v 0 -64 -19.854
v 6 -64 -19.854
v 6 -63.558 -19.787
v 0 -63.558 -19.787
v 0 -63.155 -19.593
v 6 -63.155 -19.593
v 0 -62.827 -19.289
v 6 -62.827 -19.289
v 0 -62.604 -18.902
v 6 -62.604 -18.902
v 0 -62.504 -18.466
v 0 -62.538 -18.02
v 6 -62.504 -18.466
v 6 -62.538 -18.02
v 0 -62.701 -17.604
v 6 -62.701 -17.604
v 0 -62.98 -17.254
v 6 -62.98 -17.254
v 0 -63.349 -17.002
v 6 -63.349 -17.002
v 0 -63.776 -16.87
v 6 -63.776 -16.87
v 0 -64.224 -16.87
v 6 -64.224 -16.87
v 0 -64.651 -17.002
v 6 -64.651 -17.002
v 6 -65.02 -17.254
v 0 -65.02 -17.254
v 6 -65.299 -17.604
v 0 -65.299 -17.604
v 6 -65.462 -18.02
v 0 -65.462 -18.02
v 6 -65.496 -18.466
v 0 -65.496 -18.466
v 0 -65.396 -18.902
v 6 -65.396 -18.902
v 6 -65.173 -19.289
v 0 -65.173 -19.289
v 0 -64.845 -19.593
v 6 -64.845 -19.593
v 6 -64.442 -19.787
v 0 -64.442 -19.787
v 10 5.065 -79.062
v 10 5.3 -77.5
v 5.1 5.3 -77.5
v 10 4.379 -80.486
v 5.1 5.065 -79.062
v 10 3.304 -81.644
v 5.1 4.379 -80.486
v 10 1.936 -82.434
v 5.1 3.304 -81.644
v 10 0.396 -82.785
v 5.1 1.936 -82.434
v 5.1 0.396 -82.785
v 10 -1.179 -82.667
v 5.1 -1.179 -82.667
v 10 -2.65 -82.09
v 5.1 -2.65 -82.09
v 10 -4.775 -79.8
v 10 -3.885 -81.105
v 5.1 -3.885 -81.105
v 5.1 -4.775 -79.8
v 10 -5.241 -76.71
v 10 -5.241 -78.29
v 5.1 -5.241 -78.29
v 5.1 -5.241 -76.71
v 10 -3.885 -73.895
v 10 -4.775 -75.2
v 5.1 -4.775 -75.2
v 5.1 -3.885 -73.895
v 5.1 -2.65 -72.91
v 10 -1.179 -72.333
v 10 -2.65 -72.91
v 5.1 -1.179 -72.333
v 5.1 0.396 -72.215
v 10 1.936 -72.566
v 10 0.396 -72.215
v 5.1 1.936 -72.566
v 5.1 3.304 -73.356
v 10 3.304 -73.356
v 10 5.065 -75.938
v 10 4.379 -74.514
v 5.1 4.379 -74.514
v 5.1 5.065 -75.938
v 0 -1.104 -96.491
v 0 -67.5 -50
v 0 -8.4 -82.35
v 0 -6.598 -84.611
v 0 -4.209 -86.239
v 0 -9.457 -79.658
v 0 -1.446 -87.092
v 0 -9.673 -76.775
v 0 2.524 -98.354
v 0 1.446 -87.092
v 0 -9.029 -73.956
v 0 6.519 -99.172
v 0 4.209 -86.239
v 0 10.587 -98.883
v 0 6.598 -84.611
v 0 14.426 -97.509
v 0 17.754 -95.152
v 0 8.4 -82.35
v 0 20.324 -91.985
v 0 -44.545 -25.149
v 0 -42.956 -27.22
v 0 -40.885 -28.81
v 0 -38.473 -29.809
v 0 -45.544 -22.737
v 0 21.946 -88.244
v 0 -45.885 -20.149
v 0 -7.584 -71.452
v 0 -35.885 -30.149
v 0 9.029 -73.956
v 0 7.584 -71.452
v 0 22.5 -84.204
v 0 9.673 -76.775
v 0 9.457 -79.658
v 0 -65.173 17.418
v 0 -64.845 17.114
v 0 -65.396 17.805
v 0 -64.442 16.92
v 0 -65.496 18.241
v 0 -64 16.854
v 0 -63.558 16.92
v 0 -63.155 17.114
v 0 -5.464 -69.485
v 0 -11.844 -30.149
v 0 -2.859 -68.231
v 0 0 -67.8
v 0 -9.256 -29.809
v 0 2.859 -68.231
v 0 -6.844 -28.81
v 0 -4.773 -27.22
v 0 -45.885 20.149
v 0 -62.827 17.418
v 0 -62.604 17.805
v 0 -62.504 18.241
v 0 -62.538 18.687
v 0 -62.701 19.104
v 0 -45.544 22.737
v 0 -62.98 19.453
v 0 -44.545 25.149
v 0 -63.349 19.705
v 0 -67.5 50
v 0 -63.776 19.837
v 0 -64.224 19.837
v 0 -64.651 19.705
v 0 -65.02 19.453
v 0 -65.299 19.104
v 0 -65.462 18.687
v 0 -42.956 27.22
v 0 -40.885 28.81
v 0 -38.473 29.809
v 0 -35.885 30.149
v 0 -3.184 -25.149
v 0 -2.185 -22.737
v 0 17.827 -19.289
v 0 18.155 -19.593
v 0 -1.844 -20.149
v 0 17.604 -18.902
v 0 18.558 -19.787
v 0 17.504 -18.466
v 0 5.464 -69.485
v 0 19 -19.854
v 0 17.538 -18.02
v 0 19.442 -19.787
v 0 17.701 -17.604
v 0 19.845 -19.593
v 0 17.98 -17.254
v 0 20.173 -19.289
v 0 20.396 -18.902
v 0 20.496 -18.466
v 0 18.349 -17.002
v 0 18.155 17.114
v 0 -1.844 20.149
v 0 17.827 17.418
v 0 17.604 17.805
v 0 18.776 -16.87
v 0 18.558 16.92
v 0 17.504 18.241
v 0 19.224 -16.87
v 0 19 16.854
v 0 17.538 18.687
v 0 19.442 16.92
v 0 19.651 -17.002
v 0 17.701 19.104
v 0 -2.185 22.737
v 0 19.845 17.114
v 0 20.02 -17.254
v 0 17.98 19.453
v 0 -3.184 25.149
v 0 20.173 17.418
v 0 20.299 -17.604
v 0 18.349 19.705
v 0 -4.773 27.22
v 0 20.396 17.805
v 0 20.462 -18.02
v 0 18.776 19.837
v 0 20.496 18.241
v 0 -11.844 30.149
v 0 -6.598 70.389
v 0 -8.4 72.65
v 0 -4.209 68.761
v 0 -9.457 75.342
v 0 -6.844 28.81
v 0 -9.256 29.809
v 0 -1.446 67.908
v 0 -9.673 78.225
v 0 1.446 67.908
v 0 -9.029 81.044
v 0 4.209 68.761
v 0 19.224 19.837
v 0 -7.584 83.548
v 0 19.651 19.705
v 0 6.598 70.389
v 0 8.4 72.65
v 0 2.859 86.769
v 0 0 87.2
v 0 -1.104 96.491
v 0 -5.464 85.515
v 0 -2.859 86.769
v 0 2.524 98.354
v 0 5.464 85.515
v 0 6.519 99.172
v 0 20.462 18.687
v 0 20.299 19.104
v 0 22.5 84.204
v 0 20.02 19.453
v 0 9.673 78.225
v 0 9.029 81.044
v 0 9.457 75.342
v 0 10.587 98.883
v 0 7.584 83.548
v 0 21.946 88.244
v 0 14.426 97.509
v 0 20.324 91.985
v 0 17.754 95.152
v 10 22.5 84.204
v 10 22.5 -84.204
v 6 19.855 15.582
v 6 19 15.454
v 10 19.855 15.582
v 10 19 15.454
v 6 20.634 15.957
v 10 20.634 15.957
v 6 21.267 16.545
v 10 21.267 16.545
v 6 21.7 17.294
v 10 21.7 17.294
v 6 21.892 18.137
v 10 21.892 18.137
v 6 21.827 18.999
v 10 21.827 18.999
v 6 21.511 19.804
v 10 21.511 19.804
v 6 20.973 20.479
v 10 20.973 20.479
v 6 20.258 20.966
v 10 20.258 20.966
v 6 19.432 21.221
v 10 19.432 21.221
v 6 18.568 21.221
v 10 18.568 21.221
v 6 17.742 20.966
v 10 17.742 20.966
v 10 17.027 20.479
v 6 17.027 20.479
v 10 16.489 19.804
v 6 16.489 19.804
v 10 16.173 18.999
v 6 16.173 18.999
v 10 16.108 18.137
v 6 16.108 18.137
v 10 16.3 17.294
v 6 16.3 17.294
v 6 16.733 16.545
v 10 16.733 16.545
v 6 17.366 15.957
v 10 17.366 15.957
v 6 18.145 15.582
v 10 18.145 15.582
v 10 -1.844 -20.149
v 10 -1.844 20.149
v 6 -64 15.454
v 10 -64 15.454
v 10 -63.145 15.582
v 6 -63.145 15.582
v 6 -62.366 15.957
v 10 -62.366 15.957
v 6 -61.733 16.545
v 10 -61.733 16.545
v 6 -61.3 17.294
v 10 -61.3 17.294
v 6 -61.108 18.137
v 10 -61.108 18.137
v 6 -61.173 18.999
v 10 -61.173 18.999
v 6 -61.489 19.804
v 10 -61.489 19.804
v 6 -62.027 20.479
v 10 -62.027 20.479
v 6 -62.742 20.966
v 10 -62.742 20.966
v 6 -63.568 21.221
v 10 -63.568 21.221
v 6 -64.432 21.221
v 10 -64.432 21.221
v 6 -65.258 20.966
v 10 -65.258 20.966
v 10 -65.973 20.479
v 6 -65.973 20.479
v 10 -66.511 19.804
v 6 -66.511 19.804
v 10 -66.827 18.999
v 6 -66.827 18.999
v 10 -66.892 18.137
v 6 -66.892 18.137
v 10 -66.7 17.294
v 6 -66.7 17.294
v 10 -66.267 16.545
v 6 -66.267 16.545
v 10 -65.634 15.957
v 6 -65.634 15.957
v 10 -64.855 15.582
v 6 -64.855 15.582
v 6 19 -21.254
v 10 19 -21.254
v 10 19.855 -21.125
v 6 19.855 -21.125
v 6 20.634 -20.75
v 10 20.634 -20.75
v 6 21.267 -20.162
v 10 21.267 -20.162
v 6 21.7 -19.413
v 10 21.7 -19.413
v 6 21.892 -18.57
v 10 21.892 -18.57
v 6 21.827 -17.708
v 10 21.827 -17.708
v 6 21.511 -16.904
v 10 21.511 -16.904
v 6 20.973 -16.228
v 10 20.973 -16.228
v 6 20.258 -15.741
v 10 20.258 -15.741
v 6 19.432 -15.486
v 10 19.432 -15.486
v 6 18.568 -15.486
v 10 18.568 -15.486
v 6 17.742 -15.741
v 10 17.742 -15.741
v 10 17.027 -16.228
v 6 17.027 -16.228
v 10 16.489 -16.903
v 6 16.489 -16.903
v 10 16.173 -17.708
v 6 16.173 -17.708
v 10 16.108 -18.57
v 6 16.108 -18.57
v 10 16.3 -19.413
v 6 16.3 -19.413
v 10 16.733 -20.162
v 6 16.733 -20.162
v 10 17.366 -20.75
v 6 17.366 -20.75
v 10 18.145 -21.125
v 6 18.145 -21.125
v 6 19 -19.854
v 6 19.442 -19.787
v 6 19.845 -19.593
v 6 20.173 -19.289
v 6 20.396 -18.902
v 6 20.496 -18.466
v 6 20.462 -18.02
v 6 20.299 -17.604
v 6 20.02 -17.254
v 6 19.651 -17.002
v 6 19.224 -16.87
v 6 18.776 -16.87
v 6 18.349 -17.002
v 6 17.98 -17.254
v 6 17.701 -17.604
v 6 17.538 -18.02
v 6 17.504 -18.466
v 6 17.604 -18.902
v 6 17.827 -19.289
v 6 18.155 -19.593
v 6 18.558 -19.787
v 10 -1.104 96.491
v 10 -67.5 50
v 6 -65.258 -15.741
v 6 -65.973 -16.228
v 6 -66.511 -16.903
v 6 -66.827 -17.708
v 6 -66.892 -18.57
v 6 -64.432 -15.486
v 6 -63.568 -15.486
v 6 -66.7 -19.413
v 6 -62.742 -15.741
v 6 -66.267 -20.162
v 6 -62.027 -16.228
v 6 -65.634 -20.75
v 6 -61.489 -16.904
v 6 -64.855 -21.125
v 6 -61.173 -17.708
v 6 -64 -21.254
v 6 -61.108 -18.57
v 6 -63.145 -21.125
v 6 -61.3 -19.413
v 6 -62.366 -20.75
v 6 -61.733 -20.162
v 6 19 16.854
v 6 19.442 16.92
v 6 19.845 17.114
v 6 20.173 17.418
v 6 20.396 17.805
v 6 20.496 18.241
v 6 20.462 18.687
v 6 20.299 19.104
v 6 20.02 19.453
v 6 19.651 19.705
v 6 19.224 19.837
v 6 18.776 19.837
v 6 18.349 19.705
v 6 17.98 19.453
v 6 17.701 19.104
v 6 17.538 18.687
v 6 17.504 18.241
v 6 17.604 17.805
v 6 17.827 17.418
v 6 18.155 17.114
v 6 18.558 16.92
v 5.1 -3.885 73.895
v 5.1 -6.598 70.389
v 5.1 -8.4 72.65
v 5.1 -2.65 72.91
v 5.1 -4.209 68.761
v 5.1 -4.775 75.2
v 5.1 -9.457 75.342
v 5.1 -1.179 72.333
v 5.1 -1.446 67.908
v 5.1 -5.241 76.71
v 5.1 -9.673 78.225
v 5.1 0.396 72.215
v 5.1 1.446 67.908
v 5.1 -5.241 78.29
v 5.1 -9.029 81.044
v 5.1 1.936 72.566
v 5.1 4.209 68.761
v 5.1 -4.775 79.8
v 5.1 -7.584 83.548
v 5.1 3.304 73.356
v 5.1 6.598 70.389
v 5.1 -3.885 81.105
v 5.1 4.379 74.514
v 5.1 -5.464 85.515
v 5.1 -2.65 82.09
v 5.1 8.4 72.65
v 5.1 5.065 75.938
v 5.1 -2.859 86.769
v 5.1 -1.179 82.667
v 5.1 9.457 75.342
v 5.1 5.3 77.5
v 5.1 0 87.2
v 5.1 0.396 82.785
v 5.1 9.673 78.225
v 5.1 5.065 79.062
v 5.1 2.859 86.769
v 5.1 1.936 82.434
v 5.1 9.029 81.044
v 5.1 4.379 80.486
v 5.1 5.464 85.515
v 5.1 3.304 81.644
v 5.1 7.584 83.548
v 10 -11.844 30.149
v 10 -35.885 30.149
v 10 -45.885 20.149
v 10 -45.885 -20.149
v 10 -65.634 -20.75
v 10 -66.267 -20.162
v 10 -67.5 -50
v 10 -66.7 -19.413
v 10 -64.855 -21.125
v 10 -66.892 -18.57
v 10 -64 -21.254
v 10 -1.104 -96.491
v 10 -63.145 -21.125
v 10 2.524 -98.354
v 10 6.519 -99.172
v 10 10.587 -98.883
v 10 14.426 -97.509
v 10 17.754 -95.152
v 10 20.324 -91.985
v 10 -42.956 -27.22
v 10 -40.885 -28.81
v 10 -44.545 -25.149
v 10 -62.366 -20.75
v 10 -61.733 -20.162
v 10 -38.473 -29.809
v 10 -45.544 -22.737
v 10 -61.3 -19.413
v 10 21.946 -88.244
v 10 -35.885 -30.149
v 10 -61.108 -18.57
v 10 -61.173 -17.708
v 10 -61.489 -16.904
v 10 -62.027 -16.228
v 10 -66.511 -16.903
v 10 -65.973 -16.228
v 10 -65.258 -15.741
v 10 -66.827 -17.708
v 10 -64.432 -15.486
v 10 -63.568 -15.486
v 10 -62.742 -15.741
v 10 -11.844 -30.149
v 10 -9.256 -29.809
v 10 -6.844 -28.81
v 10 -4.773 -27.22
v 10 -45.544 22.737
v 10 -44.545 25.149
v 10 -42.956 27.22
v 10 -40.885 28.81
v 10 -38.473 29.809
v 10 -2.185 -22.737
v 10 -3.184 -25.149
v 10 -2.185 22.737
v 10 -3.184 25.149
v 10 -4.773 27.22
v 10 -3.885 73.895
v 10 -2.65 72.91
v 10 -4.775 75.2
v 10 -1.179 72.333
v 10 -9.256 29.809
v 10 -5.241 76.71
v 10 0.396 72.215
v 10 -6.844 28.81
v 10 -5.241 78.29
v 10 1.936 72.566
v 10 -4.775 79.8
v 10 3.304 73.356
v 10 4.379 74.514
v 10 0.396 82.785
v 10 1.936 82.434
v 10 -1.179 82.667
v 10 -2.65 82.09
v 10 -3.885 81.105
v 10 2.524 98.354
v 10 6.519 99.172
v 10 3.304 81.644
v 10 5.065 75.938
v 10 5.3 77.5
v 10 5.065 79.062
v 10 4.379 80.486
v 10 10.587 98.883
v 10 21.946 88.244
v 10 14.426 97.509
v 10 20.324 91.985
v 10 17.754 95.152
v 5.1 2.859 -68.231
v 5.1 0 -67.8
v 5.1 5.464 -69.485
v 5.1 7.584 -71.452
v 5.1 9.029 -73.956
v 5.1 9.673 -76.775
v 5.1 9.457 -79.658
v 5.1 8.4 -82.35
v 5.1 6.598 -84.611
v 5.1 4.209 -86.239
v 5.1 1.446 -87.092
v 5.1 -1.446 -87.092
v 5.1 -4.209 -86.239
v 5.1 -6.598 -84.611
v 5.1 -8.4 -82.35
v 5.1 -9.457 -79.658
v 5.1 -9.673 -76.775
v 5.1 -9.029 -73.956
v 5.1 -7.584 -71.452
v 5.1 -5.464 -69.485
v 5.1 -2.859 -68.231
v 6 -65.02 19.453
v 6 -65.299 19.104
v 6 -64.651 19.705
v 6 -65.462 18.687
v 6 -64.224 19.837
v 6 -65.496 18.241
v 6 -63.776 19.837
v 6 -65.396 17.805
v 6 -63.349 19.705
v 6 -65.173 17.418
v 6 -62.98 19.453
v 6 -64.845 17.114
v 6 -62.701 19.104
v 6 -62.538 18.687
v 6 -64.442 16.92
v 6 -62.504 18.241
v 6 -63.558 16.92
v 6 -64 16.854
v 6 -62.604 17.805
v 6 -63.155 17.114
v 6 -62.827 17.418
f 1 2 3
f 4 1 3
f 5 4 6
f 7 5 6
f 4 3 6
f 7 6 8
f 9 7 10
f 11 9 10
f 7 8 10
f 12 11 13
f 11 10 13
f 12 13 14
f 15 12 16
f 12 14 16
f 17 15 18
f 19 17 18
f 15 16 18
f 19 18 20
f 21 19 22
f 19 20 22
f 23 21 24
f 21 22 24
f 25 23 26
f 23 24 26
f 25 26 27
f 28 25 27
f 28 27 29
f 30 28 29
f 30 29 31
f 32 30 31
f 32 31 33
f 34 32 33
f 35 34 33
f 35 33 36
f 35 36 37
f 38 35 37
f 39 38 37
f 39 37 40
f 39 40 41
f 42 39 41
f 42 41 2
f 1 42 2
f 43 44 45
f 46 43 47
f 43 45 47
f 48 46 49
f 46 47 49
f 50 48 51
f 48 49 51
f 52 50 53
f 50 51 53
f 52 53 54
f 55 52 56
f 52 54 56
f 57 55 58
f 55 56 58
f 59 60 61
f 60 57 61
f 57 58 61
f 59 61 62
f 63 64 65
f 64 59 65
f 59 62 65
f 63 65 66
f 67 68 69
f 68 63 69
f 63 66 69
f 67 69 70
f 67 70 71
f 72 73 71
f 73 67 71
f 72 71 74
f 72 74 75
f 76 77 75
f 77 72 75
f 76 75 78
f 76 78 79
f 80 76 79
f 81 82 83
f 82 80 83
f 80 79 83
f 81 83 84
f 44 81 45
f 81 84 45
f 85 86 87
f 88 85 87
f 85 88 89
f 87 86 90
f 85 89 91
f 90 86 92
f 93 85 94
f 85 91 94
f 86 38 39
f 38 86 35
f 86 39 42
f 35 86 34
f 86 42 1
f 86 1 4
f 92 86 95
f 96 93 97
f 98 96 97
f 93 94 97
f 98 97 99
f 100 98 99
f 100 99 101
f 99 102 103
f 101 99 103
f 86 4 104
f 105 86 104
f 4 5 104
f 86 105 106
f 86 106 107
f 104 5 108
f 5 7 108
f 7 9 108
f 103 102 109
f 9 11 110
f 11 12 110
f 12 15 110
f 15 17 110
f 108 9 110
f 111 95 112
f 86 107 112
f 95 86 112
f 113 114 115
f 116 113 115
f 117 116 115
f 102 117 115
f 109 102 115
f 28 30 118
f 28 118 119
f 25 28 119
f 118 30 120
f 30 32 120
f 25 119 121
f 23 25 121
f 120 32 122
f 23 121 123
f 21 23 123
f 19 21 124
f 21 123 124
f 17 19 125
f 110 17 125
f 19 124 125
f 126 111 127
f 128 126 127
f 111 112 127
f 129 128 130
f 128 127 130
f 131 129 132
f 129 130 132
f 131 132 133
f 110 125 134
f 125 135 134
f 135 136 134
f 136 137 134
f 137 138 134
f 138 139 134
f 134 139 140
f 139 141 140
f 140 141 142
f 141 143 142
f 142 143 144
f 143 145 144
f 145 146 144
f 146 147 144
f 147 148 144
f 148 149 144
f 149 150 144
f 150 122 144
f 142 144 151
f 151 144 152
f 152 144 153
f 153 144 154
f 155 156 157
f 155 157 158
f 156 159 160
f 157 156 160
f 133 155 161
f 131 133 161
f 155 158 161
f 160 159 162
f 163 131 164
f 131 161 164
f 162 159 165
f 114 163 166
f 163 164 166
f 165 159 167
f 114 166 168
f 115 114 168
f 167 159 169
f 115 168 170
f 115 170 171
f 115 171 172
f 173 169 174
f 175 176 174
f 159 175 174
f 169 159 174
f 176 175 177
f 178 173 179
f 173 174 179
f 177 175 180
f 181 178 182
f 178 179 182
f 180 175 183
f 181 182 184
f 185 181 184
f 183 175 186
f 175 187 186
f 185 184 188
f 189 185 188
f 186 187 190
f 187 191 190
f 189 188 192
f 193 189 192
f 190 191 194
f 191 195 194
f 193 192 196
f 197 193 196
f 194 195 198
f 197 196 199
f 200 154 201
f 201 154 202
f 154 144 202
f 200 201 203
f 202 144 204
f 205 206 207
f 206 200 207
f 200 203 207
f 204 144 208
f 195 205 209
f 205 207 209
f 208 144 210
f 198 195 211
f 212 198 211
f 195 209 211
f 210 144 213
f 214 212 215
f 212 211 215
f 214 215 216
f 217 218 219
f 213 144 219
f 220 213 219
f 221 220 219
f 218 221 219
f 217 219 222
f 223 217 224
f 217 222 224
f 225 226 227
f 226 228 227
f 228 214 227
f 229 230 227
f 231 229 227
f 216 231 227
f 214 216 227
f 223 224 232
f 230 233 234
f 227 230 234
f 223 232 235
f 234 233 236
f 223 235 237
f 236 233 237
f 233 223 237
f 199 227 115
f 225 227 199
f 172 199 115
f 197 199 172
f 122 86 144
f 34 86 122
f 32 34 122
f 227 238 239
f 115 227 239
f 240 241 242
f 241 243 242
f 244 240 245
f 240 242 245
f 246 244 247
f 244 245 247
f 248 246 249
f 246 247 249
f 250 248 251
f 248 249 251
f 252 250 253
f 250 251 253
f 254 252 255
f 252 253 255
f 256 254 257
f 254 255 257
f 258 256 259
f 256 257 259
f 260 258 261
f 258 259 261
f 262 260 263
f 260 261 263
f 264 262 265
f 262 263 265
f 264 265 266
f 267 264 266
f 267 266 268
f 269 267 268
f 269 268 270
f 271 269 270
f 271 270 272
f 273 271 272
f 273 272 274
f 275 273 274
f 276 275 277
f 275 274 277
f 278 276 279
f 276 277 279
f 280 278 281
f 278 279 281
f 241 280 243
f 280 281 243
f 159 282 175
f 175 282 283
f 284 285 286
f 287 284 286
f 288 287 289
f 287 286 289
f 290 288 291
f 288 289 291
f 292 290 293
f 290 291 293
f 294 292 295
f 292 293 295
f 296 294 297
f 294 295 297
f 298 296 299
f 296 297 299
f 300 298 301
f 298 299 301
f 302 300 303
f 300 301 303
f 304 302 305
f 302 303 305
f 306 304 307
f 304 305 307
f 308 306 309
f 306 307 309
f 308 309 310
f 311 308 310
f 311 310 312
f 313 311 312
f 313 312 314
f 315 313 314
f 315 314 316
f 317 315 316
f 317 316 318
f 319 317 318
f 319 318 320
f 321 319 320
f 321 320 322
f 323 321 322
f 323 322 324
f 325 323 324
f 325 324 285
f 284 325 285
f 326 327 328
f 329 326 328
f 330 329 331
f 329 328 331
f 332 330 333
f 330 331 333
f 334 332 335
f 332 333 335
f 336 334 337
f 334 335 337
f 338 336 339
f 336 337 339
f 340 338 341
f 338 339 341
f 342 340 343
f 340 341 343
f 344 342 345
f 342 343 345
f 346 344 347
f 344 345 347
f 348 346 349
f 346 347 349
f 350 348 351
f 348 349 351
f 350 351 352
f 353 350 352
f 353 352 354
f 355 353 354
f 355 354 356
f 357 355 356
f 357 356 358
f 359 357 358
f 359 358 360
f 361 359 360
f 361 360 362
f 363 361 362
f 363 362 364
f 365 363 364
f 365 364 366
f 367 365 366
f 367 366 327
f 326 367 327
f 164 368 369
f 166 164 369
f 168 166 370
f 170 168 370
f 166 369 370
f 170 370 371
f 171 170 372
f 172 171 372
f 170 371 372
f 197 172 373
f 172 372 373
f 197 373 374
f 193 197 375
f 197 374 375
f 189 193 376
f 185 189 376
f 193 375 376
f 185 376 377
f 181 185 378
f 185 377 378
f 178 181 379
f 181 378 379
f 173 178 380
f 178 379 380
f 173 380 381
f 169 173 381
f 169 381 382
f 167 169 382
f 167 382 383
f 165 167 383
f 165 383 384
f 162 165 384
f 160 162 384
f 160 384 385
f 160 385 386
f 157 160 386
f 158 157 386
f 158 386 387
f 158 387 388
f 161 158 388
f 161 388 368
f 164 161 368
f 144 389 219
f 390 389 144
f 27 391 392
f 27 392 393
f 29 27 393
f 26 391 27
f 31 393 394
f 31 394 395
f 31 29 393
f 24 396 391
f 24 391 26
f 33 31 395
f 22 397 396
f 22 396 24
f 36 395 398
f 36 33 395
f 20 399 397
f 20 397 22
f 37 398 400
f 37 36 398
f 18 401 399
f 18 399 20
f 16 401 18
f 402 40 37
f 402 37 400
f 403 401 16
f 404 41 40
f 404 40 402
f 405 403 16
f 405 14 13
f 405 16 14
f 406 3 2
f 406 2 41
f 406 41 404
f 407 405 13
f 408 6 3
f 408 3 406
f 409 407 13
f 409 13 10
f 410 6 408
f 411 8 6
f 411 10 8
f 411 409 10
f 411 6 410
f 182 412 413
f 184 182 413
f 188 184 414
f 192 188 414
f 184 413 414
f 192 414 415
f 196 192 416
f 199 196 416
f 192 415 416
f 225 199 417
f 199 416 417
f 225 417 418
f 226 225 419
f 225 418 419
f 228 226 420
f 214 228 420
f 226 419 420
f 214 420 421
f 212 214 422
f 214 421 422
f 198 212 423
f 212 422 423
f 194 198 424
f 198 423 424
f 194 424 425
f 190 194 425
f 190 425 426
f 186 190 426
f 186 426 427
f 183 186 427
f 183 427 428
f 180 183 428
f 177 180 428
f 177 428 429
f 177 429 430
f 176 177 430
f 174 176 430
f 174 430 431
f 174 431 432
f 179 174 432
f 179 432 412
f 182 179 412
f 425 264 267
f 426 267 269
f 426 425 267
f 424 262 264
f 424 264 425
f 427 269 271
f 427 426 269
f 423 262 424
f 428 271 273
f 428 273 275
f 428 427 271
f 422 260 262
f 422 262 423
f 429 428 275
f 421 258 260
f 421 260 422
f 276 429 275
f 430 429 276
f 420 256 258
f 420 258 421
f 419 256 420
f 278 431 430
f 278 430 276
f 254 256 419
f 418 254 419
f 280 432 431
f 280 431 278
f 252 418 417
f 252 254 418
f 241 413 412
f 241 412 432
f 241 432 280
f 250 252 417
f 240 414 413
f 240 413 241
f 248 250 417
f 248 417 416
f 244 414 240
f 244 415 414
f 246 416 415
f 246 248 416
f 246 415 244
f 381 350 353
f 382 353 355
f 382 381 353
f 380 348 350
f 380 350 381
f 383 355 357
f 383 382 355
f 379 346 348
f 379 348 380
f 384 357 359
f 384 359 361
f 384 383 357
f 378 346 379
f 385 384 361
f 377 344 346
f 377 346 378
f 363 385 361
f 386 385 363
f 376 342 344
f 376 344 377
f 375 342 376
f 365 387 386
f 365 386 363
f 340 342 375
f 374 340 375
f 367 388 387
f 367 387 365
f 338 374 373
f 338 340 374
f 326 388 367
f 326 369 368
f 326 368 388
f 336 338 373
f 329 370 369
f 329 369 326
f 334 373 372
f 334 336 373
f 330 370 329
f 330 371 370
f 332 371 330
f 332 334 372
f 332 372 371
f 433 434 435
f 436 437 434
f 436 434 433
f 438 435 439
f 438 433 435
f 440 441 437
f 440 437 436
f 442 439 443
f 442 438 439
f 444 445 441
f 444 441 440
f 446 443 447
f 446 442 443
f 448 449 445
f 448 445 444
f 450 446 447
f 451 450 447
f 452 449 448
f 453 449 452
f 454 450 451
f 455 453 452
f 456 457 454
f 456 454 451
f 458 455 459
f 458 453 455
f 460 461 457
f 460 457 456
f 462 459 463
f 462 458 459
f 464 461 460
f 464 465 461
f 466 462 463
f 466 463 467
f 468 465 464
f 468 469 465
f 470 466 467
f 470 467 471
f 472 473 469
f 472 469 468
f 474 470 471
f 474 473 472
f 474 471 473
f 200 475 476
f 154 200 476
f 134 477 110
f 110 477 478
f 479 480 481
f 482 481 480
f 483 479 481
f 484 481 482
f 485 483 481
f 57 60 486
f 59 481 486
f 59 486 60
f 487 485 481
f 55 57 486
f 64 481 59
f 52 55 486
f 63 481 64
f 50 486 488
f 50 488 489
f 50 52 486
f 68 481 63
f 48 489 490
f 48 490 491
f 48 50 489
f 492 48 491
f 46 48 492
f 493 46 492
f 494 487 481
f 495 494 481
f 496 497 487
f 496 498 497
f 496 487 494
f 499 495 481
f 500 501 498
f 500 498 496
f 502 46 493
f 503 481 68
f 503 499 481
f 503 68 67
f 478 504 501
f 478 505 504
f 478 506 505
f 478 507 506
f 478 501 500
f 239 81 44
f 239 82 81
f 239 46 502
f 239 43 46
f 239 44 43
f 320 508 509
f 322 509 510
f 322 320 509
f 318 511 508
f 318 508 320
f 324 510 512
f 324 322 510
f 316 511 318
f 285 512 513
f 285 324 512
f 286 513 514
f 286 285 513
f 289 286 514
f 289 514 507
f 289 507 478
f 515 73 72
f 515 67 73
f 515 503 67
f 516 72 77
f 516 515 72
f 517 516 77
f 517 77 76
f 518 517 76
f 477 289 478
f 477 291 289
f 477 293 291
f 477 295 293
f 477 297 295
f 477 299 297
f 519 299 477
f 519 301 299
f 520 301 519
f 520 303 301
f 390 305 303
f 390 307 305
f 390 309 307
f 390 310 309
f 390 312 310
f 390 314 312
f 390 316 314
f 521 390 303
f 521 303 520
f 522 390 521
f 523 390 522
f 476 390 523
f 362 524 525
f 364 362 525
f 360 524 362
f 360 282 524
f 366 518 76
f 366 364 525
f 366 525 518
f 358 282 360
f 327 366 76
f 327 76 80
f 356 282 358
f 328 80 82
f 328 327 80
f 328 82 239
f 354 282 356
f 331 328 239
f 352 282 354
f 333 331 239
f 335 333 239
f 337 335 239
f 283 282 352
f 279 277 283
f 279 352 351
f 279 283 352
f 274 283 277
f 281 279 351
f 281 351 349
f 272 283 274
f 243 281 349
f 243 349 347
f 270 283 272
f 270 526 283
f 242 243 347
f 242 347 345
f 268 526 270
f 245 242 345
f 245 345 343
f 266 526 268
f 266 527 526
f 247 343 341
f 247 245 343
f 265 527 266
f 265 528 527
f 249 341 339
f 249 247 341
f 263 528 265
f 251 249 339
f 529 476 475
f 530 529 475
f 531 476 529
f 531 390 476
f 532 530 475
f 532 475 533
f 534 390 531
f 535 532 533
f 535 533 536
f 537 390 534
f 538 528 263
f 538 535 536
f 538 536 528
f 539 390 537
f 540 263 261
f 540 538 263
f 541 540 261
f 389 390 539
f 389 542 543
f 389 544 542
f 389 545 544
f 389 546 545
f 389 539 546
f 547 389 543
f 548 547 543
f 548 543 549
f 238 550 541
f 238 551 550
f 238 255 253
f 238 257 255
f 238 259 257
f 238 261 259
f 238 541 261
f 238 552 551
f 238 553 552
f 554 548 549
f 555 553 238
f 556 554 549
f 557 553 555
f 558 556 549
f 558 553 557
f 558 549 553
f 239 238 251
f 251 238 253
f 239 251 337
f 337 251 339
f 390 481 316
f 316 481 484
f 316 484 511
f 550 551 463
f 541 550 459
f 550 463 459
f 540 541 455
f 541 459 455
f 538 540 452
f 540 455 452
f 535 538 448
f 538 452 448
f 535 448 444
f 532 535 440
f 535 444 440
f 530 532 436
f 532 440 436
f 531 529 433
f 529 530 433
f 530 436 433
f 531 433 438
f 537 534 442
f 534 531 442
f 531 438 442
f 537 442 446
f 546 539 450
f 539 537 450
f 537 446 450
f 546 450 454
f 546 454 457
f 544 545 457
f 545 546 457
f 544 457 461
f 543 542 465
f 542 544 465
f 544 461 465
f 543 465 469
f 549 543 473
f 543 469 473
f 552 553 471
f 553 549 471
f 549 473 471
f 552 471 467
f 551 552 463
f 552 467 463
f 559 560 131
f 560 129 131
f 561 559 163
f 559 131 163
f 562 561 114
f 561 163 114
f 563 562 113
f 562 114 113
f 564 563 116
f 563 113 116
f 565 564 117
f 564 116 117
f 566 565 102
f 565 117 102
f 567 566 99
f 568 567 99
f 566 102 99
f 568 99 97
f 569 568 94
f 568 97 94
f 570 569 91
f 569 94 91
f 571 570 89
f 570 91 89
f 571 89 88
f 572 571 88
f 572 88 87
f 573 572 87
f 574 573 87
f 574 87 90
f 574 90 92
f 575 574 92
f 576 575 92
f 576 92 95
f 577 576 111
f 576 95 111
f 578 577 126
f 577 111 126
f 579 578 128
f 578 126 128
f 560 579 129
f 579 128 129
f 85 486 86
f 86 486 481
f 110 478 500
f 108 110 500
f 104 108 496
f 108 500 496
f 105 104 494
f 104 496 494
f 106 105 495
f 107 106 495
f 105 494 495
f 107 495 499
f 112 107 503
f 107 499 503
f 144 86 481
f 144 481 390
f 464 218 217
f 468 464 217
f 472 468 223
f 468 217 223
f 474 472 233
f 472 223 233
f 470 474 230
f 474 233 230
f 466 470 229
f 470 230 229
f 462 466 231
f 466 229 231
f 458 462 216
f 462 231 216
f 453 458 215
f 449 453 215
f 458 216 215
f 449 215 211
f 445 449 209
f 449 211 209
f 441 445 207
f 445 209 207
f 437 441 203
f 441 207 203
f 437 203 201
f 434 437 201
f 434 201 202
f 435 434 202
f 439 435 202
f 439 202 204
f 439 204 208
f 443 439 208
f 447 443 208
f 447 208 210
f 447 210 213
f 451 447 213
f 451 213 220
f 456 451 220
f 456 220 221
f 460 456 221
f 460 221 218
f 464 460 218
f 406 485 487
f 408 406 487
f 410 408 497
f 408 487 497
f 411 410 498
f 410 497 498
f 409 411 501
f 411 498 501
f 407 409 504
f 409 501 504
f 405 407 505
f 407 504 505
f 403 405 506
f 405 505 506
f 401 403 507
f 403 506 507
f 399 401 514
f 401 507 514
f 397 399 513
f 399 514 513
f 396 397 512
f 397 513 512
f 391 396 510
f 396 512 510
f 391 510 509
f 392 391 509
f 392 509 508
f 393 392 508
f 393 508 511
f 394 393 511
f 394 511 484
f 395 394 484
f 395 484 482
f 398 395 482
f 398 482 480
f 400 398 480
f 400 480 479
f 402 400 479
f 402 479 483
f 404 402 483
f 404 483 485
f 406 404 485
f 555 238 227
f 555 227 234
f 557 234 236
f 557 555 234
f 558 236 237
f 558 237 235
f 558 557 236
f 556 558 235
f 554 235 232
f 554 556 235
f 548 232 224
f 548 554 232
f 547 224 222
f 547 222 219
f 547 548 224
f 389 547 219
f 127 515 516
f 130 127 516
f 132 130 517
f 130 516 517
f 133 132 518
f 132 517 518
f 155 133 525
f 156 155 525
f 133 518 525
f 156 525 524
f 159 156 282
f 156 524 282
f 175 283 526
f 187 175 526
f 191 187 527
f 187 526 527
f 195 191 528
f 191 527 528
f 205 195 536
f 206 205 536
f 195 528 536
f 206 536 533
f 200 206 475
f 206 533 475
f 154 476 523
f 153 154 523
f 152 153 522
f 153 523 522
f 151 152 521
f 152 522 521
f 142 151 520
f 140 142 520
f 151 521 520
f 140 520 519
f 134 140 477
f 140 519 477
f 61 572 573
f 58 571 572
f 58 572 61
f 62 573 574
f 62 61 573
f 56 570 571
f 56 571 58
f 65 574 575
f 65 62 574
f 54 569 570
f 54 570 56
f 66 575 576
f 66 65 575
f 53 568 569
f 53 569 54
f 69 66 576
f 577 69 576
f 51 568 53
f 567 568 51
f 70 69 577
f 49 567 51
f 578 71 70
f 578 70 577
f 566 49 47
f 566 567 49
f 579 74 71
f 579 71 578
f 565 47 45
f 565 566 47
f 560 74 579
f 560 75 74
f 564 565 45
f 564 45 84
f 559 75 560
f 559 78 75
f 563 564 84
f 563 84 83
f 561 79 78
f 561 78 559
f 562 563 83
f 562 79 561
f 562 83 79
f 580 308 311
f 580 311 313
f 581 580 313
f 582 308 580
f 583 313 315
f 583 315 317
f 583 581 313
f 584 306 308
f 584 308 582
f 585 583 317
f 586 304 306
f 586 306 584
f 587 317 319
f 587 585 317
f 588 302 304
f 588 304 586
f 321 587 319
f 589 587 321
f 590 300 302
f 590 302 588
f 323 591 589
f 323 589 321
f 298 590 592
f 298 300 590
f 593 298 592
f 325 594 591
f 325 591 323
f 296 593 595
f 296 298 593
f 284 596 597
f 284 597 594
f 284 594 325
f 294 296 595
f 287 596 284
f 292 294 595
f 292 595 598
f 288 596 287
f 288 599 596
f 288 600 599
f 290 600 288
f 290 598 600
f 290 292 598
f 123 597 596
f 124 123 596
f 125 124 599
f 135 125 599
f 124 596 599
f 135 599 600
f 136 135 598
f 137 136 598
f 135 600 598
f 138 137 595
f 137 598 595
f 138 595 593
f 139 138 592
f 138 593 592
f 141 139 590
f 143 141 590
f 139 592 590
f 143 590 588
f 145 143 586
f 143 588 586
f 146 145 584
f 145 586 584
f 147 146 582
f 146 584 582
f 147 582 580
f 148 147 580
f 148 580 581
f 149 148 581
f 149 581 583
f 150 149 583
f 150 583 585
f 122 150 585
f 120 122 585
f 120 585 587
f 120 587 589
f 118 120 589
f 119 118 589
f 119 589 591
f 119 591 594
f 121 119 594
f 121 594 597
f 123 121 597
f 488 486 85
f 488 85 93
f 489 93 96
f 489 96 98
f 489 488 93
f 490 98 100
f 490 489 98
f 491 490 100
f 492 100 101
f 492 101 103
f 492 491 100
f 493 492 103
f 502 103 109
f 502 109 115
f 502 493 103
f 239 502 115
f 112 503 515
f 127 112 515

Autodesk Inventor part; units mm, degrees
ref_plane "YZ Plane" through (0, 0, 0) normal (1, 0, 0) x (0, 1, 0)
ref_plane "XZ Plane" through (0, 0, 0) normal (0, 1, 0) x (-1, 0, 0)
ref_plane "XY Plane" through (0, 0, 0) normal (0, 0, 1) x (1, 0, 0)
sketch "Sketch1" plane through (0, 0, 0) normal (1, 0, 0) x (0, 1, 0)
  line L0 (-67.5, 145) -> (67.5, 145)
  line L1 (67.5, 145) -> (67.5, -145)
  line L2 (67.5, -145) -> (-67.5, -145)
  line L3 (-67.5, -145) -> (-67.5, 145)
  line L4 (-67.5, 145) -> (67.5, -145) construction
  line L5 (67.5, 145) -> (-67.5, -145) construction
  circle A0 centre (0, 77.5) radius 5.3
  circle A1 centre (0, -77.5) radius 5.3
  circle A2 centre (0, 0) radius 5.3
  line L6 (0, 77.5) -> (0, -77.5) construction
  line L7 (57.5, -135) -> (57.5, 135)
  line L8 (57.5, 135) -> (-57.5, 135)
  line L9 (-57.5, 135) -> (-57.5, -135)
  line L10 (-57.5, -135) -> (57.5, -135)
  dimension "d0" = 155
  dimension "d1" = 10.6
  dimension "d2" = 290
  dimension "d3" = 135
  dimension "d4" = 10
extrude "Extrusion1" add sketch "Sketch1" along normal blind 10 contours L0 L1 L2 L3 | A2 | L10 L9 L8 L7
chamfer "Chamfer2" distance 20 angle 45 4 edges at (5, 67.5, -145) (5, -67.5, -145) (5, -67.5, 145) (5, 67.5, 145)
sketch "Sketch5" plane through (10, 0, 0) normal (1, 0, 0) x (0, 0, -1)
  line L0 (50, -67.5) -> (-50, -67.5) projected
  circle A0 centre (0, -15) radius 11 projected
  circle A1 centre (33.234, -33.234) radius 2.75 projected
  circle A2 centre (-33.234, -33.234) radius 2.75 projected
  line L1 (96.4912, -1.1036) -> (50, -67.5) projected
  line L2 (-50, -67.5) -> (-96.4912, -1.1036) projected
  arc A3 (-84.2039, 22.5) -> (-96.4912, -1.1036) centre (-84.2039, 7.5) ccw projected
  line L3 (-84.2039, 22.5) -> (84.2039, 22.5) projected
  arc A4 (96.4912, -1.1036) -> (84.2039, 22.5) centre (84.2039, 7.5) ccw projected
  circle A5 centre (-18.3535, 19) radius 1.5 projected
  circle A6 centre (18.3535, -64) radius 1.5 projected
  circle A7 centre (18.3535, 19) radius 1.5 projected
  circle A8 centre (-18.3535, -64) radius 1.5 projected
  point P0 (0, 0)
extrude "Extrusion4" [suppressed]
sketch "Sketch6" plane through (10, 0, 0) normal (1, 0, 0) x (0, 0, -1)
  line L0 (-145, 47.5) -> (-125, 67.5) projected
  line L1 (-145, 47.5) -> (-145, -47.5) projected
  line L2 (-125, -67.5) -> (-145, -47.5) projected
  line L3 (-125, -67.5) -> (125, -67.5) projected
  line L4 (145, -47.5) -> (125, -67.5) projected
  line L5 (145, -47.5) -> (145, 47.5) projected
  line L6 (125, 67.5) -> (145, 47.5) projected
  line L7 (125, 67.5) -> (-125, 67.5) projected
  circle A0 centre (-77.5, 0) radius 5.3 projected
  circle A1 centre (77.5, 0) radius 5.3 projected
  circle A2 centre (-131.5, 54) radius 2.9
  circle A3 centre (-96.5, -41.5) radius 2.9
  circle A4 centre (96.5, -41.5) radius 2.9
  circle A5 centre (111.5, 46.5) radius 2.9
  point P0 (0, 0)
  dimension "d21" = 5.8
extrude "Extrusion5" cut sketch "Sketch6" against normal blind 3.5 contours A2 | A3 | A4 | A5
sketch "Sketch7" plane through (10, 0, 0) normal (1, 0, 0) x (0, 0, -1)
  circle A0 centre (96.5, -41.5) radius 2.9 projected
  circle A1 centre (-96.5, -41.5) radius 2.9 projected
  circle A2 centre (111.5, 46.5) radius 2.9 projected
  circle A3 centre (-131.5, 54) radius 2.9 projected
  line L0 (-145, 47.5) -> (-125, 67.5) projected
  line L1 (-145, 47.5) -> (-145, -47.5) projected
  line L2 (-125, -67.5) -> (-145, -47.5) projected
  line L3 (-125, -67.5) -> (125, -67.5) projected
  line L4 (145, -47.5) -> (125, -67.5) projected
  line L5 (145, -47.5) -> (145, 47.5) projected
  line L6 (125, 67.5) -> (145, 47.5) projected
  line L7 (125, 67.5) -> (-125, 67.5) projected
  circle A4 centre (-77.5, 0) radius 5.3 projected
  circle A5 centre (77.5, 0) radius 5.3 projected
  line L8 (0, -67.5) -> (0, 22.5)
  line L9 (0, 22.5) -> (-84.2039, 22.5)
  line L10 (-96.4912, -1.1036) -> (-50, -67.5)
  line L11 (-125, -67.5) -> (125, -67.5) projected
  arc A6 (-84.2039, 22.5) -> (-96.4912, -1.1036) centre (-84.2039, 7.5) ccw
  line L12 (0, 22.5) -> (84.2039, 22.5)
  line L13 (96.4912, -1.1036) -> (50, -67.5)
  arc A7 (96.4912, -1.1036) -> (84.2039, 22.5) centre (84.2039, 7.5) ccw
  point P0 (0, 0)
  point P1 (-50, -67.5)
  point P2 (50, -67.5)
  dimension "d27" = 90
  dimension "d28" = 15
  dimension "d29" = 50
  dimension "d30" = 55
extrude "Extrusion6" cut sketch "Sketch7" against normal through all contours A0 | A1 | A2 | A3 | L0 L7 L6 L5 L4 L3 L13 A7 L12 L9 A6 L10 L2 L1
sketch "Sketch8" plane through (10, 0, 0) normal (1, 0, 0) x (0, 0, -1)
  circle A0 centre (-18.3535, 19) radius 1.5 projected
  circle A1 centre (18.3535, 19) radius 1.5 projected
  circle A2 centre (18.3535, -64) radius 1.5 projected
  circle A3 centre (-18.3535, -64) radius 1.5 projected
  point P0 (0, 0)
extrude "Extrusion7" cut sketch "Sketch8" against normal through all
sketch "Sketch9" plane through (10, 0, 0) normal (1, 0, 0) x (0, 0, -1)
  circle A0 centre (-18.3535, -64) radius 1.5 projected
  circle A1 centre (18.3535, 19) radius 1.5 projected
  circle A2 centre (18.3535, -64) radius 1.5 projected
  circle A3 centre (-18.3535, 19) radius 1.5 projected
  line L0 (-96.4912, -1.1036) -> (-50, -67.5) projected
  line L1 (-50, -67.5) -> (50, -67.5) projected
  line L2 (50, -67.5) -> (96.4912, -1.1036) projected
  arc A4 (96.4912, -1.1036) -> (84.2039, 22.5) centre (84.2039, 7.5) ccw projected
  line L3 (84.2039, 22.5) -> (-84.2039, 22.5) projected
  arc A5 (-84.2039, 22.5) -> (-96.4912, -1.1036) centre (-84.2039, 7.5) ccw projected
  circle A6 centre (-77.5, 0) radius 5.3 projected
  circle A7 centre (77.5, 0) radius 5.3 projected
  circle A8 centre (-18.3535, 19) radius 2.9
  circle A9 centre (18.3535, 19) radius 2.9
  circle A10 centre (-18.3535, -64) radius 2.9
  circle A11 centre (18.3535, -64) radius 2.9
  point P0 (0, 0)
  dimension "d35" = 5.8
extrude "Extrusion8" cut sketch "Sketch9" against normal blind 4 contours A0 | A1 | A2 | A3 | A8 | A9 | A10 | A11
sketch "Sketch10" plane through (10, 0, 0) normal (1, 0, 0) x (0, 0, -1)
  line L0 (-20.1493, -45.8848) -> (20.1493, -45.8848)
  line L1 (30.1493, -35.8848) -> (30.1493, -11.8439)
  line L2 (20.1493, -1.8439) -> (-20.1493, -1.8439)
  line L3 (-30.1493, -11.8439) -> (-30.1493, -35.8848)
  line L4 (-30.1493, -45.8848) -> (30.1493, -1.8439) construction
  line L5 (30.1493, -45.8848) -> (-30.1493, -1.8439) construction
  arc A0 (-20.1493, -1.8439) -> (-30.1493, -11.8439) centre (-20.1493, -11.8439) ccw
  arc A1 (30.1493, -11.8439) -> (20.1493, -1.8439) centre (20.1493, -11.8439) ccw
  arc A2 (20.1493, -45.8848) -> (30.1493, -35.8848) centre (20.1493, -35.8848) ccw
  arc A3 (-30.1493, -35.8848) -> (-20.1493, -45.8848) centre (-20.1493, -35.8848) ccw
  point P0 (0, 0)
  point P1 (0, -23.8644)
  dimension "d38" = 10
extrude "Extrusion9" cut sketch "Sketch10" against normal through all
sketch "Sketch11" plane through (0, 0, 0) normal (-1, 0, 0) x (0, 0, 1)
  circle A0 centre (-77.5, 0) radius 5.3 projected
  circle A1 centre (77.5, 0) radius 5.3 projected
  circle A2 centre (-77.5, 0) radius 9.7
  circle A3 centre (77.5, 0) radius 9.7
  point P0 (0, 0)
  dimension "d41" = 19.4
extrude "Extrusion10" cut sketch "Sketch11" against normal blind 5.1 contours A0 | A1 | A2 | A3
properties part number "CAJA" material "Steel, Mild, Welded"
